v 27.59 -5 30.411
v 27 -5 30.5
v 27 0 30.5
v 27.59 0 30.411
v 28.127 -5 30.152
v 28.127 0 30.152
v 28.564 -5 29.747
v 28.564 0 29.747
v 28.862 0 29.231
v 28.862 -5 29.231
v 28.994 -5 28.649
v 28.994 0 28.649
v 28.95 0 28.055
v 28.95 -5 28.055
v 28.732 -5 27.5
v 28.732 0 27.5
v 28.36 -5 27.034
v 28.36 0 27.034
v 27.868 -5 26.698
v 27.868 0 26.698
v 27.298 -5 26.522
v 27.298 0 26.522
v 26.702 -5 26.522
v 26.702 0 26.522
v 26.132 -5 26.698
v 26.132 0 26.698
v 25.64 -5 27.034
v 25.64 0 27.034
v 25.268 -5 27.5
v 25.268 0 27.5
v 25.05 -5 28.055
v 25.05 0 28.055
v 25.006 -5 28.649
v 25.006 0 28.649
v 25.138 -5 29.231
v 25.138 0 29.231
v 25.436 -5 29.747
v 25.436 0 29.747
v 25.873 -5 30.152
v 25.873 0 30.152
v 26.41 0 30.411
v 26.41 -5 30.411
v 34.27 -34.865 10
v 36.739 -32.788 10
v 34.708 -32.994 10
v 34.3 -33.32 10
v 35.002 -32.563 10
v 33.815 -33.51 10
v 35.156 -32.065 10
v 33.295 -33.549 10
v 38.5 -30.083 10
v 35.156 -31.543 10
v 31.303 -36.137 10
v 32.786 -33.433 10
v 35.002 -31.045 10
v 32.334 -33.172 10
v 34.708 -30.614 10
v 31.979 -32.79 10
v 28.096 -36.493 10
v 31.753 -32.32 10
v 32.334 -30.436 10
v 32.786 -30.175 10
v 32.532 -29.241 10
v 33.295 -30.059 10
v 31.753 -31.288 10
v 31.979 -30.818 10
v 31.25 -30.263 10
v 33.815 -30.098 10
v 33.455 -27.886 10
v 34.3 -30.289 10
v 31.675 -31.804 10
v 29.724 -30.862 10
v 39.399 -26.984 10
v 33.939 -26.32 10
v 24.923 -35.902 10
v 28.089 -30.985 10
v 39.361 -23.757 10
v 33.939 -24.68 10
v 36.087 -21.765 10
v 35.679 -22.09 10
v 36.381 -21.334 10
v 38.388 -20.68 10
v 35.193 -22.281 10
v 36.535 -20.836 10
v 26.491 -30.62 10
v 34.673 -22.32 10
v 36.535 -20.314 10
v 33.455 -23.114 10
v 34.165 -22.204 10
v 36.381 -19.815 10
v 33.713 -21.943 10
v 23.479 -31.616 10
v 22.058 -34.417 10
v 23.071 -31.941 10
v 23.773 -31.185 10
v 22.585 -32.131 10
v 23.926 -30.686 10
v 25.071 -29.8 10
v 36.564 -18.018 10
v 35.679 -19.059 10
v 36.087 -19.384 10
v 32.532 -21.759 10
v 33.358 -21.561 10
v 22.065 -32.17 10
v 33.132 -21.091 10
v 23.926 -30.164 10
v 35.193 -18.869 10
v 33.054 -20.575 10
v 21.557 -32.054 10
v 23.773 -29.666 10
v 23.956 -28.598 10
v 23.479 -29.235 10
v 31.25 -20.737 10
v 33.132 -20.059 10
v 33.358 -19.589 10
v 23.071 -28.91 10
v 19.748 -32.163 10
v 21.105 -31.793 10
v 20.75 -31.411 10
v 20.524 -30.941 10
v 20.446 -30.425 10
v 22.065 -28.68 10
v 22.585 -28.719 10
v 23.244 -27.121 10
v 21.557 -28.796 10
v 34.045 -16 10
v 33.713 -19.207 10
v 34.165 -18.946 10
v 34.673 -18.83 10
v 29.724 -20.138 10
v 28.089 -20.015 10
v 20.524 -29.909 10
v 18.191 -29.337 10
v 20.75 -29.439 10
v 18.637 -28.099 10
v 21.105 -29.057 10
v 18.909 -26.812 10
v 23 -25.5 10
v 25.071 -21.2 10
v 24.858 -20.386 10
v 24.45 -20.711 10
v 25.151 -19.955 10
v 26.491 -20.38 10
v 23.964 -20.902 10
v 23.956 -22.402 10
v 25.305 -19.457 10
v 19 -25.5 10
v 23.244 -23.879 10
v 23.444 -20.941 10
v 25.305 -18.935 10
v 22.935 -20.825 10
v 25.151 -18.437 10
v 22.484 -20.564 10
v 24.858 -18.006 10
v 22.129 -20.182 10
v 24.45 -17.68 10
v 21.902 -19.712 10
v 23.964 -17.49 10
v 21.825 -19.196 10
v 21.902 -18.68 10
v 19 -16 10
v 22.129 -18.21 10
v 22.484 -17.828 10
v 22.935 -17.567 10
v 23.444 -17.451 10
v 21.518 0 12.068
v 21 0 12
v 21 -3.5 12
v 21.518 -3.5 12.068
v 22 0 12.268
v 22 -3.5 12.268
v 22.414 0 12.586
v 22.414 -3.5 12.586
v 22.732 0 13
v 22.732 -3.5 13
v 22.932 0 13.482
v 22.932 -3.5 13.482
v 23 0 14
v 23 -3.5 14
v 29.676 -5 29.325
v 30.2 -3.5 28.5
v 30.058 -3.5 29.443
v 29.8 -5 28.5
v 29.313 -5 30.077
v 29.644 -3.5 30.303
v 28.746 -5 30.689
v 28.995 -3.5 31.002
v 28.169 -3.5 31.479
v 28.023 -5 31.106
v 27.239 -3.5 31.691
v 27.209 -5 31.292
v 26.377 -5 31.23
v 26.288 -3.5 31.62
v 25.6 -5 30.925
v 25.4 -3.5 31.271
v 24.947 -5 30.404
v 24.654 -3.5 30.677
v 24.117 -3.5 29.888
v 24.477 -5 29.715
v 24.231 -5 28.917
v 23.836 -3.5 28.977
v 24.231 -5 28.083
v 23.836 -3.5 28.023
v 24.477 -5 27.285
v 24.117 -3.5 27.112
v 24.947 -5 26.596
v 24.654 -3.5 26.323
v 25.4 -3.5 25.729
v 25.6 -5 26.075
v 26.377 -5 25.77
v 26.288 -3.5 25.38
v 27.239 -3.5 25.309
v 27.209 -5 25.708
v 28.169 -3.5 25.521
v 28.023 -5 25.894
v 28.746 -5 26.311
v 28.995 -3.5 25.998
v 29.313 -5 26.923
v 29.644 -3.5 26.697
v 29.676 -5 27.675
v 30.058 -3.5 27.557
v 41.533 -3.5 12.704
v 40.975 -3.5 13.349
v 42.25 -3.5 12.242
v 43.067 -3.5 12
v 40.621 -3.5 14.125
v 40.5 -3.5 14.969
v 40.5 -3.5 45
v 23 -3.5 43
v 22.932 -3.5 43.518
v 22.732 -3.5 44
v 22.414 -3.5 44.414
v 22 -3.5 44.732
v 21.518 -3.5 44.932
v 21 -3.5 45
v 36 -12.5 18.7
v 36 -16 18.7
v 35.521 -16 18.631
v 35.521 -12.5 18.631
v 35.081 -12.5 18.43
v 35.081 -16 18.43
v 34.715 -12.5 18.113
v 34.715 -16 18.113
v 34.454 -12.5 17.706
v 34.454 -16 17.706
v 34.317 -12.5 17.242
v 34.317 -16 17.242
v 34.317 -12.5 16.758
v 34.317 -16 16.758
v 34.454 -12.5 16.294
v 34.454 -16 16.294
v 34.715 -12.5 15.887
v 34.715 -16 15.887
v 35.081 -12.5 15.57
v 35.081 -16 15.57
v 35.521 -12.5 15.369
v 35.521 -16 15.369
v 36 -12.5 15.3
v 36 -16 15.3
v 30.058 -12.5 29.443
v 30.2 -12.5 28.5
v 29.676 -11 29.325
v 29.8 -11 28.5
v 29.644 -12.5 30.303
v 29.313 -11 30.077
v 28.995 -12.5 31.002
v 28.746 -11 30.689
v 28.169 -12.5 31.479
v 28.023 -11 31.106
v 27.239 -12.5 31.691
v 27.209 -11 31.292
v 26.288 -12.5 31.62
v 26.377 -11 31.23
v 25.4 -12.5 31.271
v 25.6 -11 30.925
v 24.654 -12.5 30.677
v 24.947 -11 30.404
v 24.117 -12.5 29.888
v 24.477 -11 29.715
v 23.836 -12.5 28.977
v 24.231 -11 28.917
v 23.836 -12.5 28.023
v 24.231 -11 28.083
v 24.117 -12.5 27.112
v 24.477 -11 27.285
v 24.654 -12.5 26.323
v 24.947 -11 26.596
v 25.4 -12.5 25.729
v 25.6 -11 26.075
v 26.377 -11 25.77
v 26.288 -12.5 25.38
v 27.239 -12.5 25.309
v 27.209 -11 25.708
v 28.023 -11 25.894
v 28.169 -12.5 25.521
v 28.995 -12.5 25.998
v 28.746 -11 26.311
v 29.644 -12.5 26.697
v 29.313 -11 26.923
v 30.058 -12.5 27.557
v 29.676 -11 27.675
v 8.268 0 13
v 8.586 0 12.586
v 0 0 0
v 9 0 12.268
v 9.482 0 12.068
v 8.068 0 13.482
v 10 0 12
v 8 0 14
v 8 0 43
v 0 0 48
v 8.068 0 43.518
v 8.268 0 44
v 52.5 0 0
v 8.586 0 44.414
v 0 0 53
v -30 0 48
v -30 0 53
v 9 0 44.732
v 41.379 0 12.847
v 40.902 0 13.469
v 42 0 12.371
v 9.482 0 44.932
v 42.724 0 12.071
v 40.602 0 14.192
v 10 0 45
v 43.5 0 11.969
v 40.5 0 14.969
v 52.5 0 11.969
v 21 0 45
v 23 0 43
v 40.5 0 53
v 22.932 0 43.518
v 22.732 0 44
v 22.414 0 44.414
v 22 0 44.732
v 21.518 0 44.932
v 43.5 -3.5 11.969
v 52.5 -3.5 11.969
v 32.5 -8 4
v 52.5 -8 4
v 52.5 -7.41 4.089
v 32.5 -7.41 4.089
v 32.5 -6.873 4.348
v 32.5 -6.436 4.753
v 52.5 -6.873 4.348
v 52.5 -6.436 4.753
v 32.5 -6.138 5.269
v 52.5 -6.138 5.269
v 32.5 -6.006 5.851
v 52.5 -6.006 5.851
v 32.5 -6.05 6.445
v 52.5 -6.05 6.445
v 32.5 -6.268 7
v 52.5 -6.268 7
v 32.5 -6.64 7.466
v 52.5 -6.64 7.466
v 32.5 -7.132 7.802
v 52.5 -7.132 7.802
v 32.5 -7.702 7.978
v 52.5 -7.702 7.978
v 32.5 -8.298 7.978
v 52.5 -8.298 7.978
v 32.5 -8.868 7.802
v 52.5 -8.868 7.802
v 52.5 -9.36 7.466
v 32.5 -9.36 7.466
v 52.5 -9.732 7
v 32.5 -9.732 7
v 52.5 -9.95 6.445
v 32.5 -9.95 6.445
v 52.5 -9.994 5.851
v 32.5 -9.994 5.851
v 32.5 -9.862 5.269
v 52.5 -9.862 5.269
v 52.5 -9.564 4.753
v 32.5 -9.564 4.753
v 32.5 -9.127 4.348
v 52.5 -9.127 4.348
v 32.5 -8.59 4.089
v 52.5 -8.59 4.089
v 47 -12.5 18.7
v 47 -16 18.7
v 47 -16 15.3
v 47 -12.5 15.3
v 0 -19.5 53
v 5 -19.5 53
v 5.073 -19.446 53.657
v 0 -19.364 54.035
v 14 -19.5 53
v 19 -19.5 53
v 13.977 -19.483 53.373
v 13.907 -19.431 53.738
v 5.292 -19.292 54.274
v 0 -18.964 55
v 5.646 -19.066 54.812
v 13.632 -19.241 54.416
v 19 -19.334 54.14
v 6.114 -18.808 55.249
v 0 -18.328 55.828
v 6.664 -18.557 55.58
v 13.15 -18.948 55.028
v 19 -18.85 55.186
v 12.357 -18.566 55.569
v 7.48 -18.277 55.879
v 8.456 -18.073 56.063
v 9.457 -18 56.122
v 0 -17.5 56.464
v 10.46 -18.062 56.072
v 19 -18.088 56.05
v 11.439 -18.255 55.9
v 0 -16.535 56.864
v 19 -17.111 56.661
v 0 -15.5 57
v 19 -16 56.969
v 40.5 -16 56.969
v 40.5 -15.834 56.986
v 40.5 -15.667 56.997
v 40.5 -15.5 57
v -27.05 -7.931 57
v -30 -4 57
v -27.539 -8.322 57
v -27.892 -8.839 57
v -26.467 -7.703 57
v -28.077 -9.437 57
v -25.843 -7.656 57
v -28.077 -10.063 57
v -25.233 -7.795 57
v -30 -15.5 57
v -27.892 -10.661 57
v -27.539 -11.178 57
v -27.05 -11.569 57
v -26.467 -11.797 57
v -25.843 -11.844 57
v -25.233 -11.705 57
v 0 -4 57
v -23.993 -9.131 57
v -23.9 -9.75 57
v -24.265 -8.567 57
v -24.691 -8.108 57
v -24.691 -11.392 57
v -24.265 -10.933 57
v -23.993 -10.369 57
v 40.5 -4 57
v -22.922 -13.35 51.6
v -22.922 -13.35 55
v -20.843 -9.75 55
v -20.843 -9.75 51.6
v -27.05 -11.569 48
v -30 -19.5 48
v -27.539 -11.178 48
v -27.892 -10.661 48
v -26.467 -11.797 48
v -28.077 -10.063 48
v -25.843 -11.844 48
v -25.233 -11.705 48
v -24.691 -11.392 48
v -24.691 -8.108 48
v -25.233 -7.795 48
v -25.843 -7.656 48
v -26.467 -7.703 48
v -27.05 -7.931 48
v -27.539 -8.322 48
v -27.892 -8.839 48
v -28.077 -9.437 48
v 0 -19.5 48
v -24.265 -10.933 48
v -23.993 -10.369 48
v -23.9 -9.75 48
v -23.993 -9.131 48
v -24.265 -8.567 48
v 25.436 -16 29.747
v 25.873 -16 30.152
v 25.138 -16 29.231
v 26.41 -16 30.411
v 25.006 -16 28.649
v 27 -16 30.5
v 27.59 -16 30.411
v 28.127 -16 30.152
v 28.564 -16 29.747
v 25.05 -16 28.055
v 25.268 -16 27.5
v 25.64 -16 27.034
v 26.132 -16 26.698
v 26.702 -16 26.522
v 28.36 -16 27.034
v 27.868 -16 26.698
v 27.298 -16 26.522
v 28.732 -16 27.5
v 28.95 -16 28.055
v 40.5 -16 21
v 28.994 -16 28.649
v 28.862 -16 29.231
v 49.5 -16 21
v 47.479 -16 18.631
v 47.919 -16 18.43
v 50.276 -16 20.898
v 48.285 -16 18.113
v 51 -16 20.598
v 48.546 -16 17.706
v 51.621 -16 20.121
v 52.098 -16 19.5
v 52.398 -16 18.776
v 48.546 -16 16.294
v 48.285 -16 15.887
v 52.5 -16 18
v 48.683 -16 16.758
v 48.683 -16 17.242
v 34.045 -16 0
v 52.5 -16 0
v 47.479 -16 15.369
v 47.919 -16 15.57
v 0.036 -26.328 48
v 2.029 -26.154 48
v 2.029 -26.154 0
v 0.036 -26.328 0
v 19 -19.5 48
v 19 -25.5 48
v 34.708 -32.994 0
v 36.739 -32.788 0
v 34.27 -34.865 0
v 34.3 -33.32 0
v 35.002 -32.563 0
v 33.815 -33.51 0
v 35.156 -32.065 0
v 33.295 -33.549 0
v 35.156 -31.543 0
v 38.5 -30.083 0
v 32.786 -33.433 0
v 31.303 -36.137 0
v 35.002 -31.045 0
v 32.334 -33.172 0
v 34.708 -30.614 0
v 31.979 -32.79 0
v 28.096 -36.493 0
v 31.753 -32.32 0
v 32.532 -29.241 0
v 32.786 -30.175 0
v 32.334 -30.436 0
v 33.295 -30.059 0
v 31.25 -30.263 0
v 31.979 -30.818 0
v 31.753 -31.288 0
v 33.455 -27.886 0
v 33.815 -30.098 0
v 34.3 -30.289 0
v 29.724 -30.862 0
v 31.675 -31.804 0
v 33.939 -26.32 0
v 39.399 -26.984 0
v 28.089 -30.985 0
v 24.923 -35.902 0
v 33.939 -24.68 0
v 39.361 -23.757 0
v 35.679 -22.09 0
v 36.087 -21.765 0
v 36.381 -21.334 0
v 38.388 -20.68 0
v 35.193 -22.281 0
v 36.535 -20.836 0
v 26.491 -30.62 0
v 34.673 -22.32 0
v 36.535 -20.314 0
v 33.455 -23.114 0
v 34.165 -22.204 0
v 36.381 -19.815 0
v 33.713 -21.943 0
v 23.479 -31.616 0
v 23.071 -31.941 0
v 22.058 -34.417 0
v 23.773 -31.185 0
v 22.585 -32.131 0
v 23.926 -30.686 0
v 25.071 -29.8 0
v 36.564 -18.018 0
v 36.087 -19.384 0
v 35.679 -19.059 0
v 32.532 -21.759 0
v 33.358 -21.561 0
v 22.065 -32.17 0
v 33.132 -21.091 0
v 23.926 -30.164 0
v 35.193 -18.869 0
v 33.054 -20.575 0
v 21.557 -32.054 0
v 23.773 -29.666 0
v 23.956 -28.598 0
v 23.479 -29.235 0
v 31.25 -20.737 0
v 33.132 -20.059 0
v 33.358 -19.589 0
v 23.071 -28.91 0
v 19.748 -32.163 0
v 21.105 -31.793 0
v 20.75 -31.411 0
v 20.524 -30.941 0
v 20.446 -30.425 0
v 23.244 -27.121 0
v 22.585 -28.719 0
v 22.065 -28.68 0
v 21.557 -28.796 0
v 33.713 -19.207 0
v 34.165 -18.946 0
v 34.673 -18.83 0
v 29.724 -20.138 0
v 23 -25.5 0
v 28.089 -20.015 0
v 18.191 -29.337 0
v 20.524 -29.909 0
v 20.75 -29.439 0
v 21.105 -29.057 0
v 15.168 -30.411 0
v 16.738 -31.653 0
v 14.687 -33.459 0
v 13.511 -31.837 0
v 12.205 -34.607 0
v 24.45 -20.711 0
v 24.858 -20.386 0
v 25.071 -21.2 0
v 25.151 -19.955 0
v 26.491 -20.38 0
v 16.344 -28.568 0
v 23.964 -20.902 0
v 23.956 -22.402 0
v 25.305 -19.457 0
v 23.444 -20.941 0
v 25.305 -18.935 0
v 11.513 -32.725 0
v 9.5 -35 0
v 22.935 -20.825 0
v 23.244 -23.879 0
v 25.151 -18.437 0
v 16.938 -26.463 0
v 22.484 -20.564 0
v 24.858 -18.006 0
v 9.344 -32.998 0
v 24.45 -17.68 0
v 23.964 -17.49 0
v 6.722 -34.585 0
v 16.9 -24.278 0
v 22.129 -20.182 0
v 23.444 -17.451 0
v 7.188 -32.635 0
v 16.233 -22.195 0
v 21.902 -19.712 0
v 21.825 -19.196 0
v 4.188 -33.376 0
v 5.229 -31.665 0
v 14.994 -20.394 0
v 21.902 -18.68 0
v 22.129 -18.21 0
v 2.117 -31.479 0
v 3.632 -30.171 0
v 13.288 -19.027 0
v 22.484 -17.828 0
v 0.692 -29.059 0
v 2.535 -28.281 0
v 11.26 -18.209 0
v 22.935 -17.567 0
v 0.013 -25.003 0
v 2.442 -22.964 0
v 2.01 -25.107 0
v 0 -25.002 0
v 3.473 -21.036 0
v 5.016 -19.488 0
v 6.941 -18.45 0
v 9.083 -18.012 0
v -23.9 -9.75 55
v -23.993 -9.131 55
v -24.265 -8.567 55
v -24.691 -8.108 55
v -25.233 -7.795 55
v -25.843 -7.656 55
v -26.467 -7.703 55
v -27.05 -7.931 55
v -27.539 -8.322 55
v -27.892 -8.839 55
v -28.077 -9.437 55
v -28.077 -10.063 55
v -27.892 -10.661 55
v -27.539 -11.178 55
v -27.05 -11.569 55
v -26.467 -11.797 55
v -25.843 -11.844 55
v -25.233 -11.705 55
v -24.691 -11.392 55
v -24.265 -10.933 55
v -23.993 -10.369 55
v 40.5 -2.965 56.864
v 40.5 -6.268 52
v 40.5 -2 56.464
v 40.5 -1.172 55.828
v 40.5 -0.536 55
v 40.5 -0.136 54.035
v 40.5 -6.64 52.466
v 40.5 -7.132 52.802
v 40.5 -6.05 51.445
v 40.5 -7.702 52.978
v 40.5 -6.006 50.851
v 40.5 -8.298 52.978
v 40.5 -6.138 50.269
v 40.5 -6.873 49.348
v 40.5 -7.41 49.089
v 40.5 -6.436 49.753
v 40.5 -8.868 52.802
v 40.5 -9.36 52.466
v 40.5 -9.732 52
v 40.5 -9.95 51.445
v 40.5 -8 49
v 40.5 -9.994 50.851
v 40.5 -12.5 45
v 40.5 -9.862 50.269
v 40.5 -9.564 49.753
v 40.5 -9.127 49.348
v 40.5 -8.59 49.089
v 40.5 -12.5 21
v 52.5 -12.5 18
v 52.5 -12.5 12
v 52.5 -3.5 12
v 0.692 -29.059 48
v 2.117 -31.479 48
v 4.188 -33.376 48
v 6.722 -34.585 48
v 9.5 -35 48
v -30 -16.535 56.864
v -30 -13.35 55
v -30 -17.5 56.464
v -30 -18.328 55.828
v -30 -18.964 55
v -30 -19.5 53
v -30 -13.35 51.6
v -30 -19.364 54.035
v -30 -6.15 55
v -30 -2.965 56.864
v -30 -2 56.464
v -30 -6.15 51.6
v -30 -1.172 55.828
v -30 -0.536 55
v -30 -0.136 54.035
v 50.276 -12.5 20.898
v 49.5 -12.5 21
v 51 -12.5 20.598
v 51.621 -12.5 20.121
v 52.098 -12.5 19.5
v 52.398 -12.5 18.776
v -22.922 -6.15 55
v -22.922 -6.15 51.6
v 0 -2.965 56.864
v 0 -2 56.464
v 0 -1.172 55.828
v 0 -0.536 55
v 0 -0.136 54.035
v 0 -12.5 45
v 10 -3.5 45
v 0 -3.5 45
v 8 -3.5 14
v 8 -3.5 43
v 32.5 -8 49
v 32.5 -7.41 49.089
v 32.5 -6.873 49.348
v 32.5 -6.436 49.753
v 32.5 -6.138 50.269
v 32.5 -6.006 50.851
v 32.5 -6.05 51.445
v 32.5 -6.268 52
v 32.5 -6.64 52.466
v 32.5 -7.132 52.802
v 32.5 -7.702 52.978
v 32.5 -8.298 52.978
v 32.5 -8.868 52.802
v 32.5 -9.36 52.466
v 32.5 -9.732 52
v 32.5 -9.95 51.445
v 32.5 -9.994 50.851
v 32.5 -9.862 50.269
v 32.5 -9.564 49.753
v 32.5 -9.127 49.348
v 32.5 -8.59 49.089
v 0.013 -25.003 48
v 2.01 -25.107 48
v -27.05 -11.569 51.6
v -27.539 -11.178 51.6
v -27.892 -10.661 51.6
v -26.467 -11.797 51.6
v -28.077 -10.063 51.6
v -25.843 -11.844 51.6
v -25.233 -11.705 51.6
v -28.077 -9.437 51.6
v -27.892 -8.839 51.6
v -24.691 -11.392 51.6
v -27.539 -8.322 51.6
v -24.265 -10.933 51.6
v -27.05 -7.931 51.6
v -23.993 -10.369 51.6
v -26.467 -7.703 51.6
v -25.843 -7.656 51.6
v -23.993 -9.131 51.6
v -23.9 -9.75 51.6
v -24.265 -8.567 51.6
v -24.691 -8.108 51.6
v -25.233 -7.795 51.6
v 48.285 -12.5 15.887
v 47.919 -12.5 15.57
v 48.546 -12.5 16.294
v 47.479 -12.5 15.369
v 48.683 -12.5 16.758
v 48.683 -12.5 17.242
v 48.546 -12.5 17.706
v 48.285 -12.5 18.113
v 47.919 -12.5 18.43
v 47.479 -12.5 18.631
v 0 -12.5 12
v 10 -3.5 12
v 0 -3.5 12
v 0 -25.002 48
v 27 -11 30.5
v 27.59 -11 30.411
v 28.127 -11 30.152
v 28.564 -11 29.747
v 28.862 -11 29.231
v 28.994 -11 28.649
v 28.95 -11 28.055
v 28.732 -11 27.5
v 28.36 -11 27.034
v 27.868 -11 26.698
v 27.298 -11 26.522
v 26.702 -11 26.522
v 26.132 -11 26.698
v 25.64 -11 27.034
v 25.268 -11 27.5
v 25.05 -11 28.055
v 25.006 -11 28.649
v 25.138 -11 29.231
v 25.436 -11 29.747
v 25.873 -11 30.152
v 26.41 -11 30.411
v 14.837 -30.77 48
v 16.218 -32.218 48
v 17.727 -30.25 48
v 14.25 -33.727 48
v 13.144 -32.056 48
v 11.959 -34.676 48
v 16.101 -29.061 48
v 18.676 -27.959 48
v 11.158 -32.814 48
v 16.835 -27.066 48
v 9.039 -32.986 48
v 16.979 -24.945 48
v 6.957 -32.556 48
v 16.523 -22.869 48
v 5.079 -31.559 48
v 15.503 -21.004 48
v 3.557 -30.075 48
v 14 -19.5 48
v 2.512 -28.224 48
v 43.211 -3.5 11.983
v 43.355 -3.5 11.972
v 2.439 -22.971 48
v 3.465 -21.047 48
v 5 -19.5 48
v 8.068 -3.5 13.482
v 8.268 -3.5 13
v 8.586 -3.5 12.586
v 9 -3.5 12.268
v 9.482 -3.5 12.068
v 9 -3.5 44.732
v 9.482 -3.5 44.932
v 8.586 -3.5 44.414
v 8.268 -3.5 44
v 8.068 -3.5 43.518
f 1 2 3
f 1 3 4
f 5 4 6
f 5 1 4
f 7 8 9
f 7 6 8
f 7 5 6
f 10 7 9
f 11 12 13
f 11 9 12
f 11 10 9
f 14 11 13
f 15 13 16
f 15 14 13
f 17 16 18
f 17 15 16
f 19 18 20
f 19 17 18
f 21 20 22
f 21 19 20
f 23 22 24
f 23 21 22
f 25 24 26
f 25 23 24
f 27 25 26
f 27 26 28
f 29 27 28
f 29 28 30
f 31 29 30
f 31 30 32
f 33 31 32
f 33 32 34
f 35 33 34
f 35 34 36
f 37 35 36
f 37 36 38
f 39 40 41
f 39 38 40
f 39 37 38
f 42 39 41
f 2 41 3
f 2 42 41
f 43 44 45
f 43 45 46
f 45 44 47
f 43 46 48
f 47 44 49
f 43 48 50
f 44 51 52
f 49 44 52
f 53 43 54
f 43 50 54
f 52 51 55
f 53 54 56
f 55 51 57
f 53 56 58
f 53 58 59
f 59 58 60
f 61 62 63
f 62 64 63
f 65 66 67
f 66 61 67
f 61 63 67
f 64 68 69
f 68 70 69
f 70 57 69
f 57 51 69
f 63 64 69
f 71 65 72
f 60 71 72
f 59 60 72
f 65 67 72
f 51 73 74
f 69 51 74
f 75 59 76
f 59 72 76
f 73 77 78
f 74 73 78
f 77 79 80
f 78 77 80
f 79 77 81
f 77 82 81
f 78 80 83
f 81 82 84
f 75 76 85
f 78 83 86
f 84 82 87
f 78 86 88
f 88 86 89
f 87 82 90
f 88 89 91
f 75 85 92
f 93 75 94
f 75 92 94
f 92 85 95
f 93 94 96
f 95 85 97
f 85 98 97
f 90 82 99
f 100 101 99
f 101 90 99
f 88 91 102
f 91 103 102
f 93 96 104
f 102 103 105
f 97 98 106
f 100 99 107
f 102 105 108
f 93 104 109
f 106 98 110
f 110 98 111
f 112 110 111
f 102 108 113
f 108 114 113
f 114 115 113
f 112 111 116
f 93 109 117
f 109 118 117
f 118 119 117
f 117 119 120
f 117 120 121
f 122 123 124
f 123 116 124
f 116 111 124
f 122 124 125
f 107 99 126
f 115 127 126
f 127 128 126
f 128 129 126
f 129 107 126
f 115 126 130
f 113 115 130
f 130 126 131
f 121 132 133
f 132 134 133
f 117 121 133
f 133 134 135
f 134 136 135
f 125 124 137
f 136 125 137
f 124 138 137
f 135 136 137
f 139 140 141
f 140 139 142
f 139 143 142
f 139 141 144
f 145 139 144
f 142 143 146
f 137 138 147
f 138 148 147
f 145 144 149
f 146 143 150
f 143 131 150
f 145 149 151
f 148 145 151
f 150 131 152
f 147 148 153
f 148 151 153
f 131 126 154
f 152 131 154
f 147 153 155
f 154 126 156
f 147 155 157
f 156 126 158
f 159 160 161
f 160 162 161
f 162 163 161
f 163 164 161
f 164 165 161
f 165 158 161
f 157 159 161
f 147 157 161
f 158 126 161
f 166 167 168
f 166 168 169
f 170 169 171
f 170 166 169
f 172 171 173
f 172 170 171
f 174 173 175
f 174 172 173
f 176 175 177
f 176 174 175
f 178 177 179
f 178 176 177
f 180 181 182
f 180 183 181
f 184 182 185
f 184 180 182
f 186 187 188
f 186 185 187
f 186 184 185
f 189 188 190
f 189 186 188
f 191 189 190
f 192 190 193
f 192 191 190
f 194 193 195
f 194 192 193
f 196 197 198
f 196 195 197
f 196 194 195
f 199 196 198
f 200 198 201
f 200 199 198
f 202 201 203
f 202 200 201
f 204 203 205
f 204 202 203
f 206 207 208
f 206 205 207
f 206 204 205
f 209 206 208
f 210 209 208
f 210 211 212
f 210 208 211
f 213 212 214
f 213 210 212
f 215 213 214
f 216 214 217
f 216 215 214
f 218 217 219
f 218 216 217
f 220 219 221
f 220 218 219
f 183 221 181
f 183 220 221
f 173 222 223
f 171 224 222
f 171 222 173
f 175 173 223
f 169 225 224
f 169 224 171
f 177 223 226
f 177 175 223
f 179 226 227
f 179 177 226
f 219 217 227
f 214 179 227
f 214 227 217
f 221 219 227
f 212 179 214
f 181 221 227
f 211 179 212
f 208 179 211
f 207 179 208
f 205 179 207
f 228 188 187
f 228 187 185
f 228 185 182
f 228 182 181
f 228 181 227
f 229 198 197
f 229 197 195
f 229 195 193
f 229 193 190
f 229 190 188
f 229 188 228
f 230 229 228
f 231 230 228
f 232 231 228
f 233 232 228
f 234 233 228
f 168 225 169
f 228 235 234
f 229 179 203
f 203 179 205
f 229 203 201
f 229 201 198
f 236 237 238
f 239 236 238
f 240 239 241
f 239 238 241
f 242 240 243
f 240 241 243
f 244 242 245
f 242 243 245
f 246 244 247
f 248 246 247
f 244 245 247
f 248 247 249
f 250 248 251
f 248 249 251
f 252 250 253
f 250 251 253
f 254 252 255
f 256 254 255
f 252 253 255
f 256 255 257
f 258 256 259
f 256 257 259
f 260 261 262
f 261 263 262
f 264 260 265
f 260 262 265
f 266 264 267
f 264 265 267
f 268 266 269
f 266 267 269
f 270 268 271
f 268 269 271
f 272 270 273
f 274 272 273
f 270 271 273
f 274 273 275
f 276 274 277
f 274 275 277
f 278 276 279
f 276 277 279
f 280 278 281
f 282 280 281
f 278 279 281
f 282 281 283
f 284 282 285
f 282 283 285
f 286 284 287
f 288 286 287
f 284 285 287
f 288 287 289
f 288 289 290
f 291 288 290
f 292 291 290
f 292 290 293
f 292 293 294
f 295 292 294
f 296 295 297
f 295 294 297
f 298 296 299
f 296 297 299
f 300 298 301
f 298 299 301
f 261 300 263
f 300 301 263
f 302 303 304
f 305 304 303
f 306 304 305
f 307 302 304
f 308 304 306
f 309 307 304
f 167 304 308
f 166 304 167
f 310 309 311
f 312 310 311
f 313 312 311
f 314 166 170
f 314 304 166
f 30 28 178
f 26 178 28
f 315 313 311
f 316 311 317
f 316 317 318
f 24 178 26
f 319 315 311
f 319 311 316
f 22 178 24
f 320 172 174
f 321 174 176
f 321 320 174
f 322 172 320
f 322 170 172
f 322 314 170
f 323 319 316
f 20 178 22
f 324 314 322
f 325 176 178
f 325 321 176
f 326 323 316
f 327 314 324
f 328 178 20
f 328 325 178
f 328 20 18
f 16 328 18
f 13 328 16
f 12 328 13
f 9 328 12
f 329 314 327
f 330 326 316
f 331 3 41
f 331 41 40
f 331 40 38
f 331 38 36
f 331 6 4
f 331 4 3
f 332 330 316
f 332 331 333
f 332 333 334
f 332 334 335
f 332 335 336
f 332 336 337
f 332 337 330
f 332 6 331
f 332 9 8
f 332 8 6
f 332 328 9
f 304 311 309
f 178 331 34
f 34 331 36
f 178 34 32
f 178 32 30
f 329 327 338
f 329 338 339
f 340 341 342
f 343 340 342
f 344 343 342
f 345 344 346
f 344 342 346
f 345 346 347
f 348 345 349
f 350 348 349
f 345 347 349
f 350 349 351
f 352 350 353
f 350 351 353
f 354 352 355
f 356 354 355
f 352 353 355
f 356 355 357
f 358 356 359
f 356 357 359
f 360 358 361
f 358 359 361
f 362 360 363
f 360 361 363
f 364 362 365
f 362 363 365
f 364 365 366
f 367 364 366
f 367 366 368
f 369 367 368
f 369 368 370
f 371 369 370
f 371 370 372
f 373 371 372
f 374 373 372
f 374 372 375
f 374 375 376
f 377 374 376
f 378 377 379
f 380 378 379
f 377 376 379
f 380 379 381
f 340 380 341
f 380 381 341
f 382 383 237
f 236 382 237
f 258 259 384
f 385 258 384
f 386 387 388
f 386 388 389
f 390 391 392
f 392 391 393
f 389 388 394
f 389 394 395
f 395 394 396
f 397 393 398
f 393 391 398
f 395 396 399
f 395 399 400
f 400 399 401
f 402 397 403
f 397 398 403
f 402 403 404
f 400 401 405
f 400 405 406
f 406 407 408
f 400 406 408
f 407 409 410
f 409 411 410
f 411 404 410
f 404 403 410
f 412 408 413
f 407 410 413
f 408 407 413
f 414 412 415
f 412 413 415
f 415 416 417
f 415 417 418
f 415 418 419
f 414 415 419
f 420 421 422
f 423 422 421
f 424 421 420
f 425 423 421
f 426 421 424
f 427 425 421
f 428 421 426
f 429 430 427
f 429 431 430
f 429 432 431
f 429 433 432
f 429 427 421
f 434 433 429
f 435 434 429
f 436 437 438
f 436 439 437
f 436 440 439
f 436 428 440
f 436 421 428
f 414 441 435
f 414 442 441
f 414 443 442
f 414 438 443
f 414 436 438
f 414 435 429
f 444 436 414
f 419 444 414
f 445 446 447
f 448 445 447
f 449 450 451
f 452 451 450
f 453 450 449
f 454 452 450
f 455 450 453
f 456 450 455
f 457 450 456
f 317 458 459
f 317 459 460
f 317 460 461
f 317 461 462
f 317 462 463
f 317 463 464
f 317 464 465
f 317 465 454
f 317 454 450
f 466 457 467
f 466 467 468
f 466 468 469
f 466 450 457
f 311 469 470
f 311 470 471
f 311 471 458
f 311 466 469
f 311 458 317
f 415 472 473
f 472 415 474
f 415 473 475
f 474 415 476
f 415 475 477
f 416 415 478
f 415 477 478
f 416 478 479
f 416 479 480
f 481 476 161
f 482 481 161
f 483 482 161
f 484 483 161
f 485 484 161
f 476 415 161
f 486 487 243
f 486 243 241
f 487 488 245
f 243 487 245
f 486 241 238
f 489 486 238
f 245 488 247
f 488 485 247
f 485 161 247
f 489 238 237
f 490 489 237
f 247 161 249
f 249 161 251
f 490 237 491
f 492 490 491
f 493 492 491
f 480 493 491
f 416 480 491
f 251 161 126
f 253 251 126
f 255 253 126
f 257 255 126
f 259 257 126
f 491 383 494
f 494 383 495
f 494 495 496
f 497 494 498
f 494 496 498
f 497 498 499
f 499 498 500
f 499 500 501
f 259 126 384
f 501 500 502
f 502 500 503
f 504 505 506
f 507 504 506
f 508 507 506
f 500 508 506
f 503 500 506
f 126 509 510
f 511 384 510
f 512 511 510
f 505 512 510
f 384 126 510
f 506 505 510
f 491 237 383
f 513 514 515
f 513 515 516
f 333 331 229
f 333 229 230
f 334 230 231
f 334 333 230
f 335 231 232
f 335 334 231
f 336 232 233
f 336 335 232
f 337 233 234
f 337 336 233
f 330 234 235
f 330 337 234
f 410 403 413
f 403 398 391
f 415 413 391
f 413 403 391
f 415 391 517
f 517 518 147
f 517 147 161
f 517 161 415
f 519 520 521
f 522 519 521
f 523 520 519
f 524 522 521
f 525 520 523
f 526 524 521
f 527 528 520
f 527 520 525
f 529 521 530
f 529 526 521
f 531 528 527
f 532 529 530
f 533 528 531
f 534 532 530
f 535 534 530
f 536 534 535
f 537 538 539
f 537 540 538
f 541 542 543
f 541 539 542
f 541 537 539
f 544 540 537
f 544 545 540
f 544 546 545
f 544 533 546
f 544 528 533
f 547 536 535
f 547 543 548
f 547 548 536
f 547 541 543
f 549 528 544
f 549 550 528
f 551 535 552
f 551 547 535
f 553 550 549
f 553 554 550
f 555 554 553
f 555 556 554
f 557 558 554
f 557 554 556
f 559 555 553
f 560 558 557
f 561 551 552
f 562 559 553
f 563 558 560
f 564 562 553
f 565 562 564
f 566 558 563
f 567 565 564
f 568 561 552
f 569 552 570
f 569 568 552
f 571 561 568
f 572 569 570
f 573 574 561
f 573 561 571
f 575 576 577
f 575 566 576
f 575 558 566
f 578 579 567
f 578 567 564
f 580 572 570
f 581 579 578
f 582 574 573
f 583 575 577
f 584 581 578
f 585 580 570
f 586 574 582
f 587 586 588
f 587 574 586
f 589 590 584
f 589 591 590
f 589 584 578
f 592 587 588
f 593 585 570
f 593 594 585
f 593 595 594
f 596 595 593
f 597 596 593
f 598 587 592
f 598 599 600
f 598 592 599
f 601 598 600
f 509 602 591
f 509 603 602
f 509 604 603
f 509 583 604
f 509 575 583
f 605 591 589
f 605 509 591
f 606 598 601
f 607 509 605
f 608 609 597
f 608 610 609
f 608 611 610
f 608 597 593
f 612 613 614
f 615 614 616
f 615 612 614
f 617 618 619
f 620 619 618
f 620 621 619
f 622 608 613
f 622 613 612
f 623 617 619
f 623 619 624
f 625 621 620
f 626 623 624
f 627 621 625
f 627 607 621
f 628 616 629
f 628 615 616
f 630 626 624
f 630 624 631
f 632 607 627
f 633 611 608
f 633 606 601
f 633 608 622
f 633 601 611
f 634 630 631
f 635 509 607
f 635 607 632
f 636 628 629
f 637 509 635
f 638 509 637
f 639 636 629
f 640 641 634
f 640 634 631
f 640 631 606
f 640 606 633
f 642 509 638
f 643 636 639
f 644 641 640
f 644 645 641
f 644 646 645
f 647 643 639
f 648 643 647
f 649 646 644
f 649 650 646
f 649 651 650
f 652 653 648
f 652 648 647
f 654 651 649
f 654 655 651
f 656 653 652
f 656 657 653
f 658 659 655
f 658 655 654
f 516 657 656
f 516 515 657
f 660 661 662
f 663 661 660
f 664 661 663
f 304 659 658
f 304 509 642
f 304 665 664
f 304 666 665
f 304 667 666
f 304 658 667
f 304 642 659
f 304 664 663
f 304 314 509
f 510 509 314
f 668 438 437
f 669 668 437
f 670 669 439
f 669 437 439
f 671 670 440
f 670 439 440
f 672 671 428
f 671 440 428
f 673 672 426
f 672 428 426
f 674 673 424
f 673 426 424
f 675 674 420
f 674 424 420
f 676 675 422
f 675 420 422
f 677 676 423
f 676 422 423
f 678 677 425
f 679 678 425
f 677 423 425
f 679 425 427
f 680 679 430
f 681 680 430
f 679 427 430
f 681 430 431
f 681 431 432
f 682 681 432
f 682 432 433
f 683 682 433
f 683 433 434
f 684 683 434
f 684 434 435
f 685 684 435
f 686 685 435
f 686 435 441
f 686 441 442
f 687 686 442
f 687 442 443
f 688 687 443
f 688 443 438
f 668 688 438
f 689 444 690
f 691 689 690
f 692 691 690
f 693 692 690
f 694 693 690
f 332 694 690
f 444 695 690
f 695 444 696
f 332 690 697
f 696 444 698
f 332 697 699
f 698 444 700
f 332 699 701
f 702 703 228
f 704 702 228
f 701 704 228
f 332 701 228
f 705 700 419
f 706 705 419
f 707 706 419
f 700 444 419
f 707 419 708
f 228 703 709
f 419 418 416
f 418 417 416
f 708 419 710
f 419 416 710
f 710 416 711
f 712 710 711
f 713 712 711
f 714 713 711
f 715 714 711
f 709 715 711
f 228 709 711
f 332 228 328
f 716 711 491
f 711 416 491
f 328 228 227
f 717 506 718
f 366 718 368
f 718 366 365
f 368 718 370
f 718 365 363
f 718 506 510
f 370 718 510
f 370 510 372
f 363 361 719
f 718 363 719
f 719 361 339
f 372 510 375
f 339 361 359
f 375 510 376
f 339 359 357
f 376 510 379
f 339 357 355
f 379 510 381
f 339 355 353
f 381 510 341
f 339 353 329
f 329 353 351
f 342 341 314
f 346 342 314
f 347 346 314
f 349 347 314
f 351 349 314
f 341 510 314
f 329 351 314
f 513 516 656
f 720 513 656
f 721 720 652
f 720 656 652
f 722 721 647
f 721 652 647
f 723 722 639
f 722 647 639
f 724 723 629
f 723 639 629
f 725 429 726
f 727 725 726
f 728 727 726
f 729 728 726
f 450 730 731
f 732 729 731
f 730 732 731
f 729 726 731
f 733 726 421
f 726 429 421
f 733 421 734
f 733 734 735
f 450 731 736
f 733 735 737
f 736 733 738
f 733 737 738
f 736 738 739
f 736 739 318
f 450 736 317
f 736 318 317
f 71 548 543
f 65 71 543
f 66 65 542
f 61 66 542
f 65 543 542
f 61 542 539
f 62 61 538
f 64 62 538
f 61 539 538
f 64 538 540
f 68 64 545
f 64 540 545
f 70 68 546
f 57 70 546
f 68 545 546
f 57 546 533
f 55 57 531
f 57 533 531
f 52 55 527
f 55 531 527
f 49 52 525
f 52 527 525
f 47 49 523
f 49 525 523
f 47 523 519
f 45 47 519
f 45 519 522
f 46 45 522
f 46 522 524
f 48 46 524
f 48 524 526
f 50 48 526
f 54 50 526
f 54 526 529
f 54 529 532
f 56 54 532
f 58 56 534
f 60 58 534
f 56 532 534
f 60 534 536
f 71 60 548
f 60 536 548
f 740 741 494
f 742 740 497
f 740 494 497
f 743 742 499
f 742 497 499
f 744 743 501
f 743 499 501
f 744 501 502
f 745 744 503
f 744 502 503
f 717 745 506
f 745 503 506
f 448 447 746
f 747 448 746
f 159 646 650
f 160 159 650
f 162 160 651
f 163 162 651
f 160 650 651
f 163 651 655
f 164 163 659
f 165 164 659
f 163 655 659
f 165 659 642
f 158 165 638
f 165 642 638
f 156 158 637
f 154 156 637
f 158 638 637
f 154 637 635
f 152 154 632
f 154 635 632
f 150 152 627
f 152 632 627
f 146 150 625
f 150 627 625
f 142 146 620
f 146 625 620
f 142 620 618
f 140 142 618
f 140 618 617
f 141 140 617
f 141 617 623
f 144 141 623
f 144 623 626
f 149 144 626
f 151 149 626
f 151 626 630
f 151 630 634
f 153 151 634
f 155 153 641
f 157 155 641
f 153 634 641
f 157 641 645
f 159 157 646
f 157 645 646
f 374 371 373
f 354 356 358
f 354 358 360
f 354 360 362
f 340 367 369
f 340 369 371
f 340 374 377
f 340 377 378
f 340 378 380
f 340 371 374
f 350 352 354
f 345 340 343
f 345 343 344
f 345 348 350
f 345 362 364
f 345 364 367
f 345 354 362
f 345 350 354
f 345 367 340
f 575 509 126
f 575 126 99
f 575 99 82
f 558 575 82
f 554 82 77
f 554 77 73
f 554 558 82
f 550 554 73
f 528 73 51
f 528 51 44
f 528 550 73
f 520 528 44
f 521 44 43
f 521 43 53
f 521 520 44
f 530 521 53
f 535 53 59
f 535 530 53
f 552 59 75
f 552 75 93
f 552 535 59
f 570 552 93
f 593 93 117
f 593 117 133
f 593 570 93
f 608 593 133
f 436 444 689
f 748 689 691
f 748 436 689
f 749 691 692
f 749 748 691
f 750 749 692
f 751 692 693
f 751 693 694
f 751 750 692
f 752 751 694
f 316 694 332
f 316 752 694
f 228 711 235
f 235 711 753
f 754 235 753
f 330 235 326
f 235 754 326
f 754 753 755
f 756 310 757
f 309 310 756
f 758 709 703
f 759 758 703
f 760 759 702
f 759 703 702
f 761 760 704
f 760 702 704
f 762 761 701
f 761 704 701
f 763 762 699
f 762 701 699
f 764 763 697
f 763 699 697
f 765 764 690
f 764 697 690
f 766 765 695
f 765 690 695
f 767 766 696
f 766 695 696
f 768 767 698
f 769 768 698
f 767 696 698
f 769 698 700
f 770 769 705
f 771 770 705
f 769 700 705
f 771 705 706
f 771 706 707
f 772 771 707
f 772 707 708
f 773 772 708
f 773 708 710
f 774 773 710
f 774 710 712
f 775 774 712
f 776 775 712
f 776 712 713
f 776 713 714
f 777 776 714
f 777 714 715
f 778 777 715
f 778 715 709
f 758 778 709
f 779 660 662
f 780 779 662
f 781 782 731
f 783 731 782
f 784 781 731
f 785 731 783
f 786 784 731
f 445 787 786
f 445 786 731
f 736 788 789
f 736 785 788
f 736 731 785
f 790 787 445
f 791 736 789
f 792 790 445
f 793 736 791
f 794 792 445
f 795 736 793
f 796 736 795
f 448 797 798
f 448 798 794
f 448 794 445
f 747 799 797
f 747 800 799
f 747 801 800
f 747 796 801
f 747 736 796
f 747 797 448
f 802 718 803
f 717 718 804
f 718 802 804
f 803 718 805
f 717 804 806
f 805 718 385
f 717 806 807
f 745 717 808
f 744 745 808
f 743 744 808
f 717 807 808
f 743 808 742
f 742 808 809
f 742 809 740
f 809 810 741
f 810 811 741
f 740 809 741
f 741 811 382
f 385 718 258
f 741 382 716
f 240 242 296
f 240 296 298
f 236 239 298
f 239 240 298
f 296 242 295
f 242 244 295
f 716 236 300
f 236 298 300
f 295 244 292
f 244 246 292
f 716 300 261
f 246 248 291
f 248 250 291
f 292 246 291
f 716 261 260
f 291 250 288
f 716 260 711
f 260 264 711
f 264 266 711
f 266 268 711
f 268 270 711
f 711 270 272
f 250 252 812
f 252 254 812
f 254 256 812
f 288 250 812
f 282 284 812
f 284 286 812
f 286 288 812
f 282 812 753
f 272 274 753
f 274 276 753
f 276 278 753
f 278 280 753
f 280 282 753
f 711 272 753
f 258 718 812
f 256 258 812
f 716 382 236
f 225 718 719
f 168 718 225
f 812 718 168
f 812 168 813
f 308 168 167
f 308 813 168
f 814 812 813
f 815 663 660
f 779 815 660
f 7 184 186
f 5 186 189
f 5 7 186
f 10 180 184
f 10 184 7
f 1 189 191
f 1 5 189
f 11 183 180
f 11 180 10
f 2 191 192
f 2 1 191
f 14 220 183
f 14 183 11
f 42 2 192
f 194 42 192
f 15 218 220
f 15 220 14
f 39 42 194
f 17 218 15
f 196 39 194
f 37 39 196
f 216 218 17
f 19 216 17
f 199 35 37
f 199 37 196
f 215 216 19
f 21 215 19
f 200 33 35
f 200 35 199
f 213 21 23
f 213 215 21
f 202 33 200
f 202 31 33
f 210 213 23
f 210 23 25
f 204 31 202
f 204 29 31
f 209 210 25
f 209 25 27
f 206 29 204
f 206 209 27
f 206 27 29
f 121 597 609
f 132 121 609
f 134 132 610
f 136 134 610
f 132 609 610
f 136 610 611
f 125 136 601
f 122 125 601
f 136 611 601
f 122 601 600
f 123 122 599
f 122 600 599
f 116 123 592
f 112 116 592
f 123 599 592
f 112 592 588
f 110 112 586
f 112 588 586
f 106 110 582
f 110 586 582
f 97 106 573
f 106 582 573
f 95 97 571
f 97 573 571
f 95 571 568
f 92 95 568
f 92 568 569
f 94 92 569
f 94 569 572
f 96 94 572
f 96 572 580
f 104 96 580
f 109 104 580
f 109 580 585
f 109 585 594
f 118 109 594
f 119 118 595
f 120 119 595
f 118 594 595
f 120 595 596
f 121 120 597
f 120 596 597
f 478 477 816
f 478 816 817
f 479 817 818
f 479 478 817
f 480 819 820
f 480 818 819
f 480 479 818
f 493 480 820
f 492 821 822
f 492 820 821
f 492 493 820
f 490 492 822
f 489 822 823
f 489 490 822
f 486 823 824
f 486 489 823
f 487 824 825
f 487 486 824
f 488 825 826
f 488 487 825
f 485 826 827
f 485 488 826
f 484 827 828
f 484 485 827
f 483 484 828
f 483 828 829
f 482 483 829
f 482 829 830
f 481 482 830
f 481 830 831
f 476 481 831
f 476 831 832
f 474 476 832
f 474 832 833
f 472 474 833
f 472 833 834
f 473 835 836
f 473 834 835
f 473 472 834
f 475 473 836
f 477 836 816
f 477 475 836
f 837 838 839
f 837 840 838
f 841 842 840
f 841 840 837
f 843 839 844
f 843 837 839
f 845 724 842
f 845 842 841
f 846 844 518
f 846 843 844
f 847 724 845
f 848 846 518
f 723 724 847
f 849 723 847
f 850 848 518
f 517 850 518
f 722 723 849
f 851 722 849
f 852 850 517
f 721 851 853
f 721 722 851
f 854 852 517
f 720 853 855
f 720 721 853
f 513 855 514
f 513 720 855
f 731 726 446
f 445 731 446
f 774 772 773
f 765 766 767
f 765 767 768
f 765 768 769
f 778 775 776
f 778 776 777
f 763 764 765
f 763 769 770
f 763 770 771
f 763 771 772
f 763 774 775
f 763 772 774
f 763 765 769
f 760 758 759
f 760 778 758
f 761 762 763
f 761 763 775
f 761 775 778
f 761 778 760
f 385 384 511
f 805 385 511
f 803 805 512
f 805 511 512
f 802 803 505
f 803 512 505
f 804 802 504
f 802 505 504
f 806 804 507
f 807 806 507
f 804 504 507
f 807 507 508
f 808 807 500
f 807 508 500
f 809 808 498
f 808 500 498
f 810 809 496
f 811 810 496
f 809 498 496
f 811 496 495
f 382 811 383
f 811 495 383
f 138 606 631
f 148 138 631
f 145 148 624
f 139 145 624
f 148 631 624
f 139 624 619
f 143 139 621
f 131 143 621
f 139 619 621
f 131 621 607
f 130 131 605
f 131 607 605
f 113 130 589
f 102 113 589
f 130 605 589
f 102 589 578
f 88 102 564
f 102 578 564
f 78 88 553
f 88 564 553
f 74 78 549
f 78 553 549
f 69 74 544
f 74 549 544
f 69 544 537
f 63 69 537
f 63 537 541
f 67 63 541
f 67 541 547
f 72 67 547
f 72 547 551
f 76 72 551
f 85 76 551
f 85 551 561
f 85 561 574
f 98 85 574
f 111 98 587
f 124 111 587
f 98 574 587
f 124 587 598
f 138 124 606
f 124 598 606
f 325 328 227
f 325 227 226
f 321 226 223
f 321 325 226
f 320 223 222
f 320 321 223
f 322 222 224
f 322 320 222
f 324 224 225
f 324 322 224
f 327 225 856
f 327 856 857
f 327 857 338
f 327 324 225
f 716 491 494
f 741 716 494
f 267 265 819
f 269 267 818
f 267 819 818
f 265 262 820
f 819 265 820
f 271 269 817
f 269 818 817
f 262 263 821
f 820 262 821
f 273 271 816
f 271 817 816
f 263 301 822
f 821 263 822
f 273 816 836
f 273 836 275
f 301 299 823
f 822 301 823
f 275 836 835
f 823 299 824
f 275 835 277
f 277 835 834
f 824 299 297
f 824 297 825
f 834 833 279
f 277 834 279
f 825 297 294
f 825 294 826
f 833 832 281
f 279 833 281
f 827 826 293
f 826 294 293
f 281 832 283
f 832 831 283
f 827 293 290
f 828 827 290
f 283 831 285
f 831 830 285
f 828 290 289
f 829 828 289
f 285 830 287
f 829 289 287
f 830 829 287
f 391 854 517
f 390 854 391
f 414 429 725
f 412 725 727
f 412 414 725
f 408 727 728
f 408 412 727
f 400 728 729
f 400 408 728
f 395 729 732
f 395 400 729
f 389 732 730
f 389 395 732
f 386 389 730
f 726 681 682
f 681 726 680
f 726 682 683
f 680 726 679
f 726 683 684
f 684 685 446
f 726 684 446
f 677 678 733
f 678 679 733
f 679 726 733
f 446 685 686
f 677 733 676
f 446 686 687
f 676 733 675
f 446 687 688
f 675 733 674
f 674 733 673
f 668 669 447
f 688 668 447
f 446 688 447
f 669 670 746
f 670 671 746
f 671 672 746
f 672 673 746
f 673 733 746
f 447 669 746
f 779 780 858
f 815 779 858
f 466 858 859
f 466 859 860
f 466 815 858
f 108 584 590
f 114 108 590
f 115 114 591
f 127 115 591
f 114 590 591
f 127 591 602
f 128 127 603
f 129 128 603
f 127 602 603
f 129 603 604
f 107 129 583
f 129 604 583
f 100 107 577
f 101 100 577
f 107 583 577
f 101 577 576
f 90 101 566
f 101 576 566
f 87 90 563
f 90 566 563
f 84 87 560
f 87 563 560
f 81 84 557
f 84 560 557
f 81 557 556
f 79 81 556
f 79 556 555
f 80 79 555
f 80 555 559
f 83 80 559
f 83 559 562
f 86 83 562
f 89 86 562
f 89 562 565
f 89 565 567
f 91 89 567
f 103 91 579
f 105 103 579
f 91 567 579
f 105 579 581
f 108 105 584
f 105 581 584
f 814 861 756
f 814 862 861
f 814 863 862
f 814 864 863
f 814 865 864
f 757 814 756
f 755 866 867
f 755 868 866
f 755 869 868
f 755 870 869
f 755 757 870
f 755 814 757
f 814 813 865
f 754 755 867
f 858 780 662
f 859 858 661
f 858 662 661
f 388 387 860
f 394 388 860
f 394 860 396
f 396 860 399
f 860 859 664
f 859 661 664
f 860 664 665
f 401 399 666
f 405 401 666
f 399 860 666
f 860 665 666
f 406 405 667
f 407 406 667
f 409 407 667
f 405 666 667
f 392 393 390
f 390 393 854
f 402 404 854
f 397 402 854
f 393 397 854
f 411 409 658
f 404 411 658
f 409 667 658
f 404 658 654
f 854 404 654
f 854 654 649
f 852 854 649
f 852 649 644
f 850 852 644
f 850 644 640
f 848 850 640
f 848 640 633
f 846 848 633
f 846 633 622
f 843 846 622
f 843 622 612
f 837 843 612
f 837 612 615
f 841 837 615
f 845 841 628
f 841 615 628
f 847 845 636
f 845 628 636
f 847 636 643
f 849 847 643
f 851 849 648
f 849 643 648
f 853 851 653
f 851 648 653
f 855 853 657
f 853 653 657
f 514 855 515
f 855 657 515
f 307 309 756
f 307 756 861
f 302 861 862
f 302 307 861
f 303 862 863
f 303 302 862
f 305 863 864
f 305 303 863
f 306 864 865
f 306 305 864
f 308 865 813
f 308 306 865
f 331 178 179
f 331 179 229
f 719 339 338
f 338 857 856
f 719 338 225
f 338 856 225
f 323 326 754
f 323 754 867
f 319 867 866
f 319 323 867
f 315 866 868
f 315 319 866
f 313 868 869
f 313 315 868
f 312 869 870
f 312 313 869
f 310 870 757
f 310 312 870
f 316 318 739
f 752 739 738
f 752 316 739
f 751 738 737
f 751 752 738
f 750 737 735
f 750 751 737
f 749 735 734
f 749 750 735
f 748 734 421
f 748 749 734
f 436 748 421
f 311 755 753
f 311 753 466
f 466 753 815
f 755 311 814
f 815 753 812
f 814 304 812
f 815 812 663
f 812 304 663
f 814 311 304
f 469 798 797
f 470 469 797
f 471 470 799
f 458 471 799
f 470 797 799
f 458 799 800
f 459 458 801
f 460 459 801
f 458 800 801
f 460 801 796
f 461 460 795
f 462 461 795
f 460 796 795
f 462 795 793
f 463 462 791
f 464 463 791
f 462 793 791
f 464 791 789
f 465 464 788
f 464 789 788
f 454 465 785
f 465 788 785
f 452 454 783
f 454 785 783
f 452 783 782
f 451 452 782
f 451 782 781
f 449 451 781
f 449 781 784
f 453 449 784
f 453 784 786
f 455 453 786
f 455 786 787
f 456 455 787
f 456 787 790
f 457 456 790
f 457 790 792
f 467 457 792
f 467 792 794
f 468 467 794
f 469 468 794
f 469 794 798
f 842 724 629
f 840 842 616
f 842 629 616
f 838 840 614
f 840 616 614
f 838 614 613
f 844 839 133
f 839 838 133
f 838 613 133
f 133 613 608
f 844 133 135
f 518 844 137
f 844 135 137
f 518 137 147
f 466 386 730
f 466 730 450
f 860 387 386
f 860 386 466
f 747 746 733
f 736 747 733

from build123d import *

# Parameters (mm, degrees)
BOSS_EXTRUDE1_DEPTH     = 57
SKETCH3_W               = 33
SKETCH3_H               = 9
SKETCH3_W_2             = 9
SKETCH3_H_2             = 15.5
CUT_EXTRUDE2_DEPTH      = 86.030876745
FILLET1_R               = 4
CUT_EXTRUDE3_DEPTH      = 86.030876745
CUT_EXTRUDE4_REACH      = 81.789
CUT_EXTRUDE5_DEPTH      = 3.5
SKETCH9_R               = 3.2
SKETCH10_R              = 2.8
CUT_EXTRUDE6_DEPTH      = 82.124903768
CUT_EXTRUDE6_DEPTH_BACK = 82.124903768
SKETCH11_R              = 2
SKETCH13_R              = 2
CUT_EXTRUDE7_DEPTH      = 20
SKETCH14_R              = 1.75
SKETCH14_R_2            = 5.5
BOSS_EXTRUDE2_DEPTH     = 10
BOSS_EXTRUDE3_DEPTH     = 30
SKETCH16_R              = 2.1
CUT_EXTRUDE8_DEPTH      = 3.4
SKETCH18_R              = 2.1
CUT_EXTRUDE9_DEPTH      = 9


with BuildPart() as part:
    # Sketch1 → Boss-Extrude1 (new body)
    with BuildSketch(Plane.XY):
        Polygon((0, 0), (0, -35), (19, -35), (19, -16), (52.5, -16), (52.5, 0), align=None)
    extrude(amount=BOSS_EXTRUDE1_DEPTH)

    # Sketch3 → Cut-Extrude2 (cut, through all)
    with BuildSketch(Plane.ZY):
        with Locations((28.5, -8)):
            Rectangle(SKETCH3_W, SKETCH3_H)
        with Locations((52.5, -27.25)):
            Rectangle(SKETCH3_W_2, SKETCH3_H_2)
    extrude(amount=-CUT_EXTRUDE2_DEPTH, mode=Mode.SUBTRACT)

    # Fillet1
    fillet1_edges = [part.edges().sort_by_distance(p)[0] for p in [
        (26.25, 0, 57),
        (9.5, -19.5, 57),
    ]]
    fillet(fillet1_edges, radius=FILLET1_R)

    # Sketch4 → Cut-Extrude3 (cut, through all)
    with BuildSketch(Plane(origin=(0, 0, 0), x_dir=(-1, 0, 0), z_dir=(0, 0, -1))):
        with BuildLine():
            Line((-0.01301942, -25.002808416), (-2.010278489, -25.107480328))
            ThreePointArc((-2.010278489, -25.107480328), (-16.998857714, -25.369106952), (-2.028539764, -26.153668071))
            Line((-2.028539764, -26.153668071), (-0.036150368, -26.327979556))
            ThreePointArc((-0.036150368, -26.327979556), (-3.081893028, -32.5041347), (-9.5, -35))
            Line((-9.5, -35), (0, -35))
            Line((0, -35), (0, -25.002053723))
            Line((0, -25.002053723), (-0.01301942, -25.002808416))
        make_face()
        with BuildLine():
            ThreePointArc((-9.5, -35), (-16.217514421, -32.217514421), (-19, -25.5))
            Line((-19, -25.5), (-19, -35))
            Line((-19, -35), (-9.5, -35))
        make_face()
    extrude(amount=-CUT_EXTRUDE3_DEPTH, mode=Mode.SUBTRACT)

    # Cut-Extrude4: up to this face of the body (flat: up to its plane)
    cut_extrude4_end = Plane(part.part.faces().sort_by_distance((26.25, -3.5, 28.5))[0])
    # Sketch5 → Cut-Extrude4 (cut, up to the picked face)
    with BuildSketch(Plane.XZ.offset(16), mode=Mode.PRIVATE) as cut_extrude4_sk1:
        with BuildLine():
            Line((47, 18.7), (36, 18.7))
            ThreePointArc((36, 18.7), (34.3, 17), (36, 15.3))
            Line((36, 15.3), (47, 15.3))
            ThreePointArc((47, 15.3), (48.7, 17), (47, 18.7))
        make_face()
    cut_extrude4_tool1 = split(extrude(cut_extrude4_sk1.sketch, amount=-CUT_EXTRUDE4_REACH, mode=Mode.PRIVATE), bisect_by=cut_extrude4_end, keep=Keep.BOTH, mode=Mode.PRIVATE)
    # Sketch5 → Cut-Extrude4 (cut, up to the picked face)
    with BuildSketch(Plane.XZ.offset(16), mode=Mode.PRIVATE) as cut_extrude4_sk2:
        with BuildLine():
            Line((40.5, 21), (49.5, 21))
            ThreePointArc((49.5, 21), (51.621320344, 20.121320344), (52.5, 18))
            Line((52.5, 18), (52.5, 57))
            Line((52.5, 57), (40.5, 57))
            Line((40.5, 57), (40.5, 21))
        make_face()
    cut_extrude4_tool2 = split(extrude(cut_extrude4_sk2.sketch, amount=-CUT_EXTRUDE4_REACH, mode=Mode.PRIVATE), bisect_by=cut_extrude4_end, keep=Keep.BOTH, mode=Mode.PRIVATE)
    add(cut_extrude4_tool1.solids().sort_by(Axis((41.5, -16, 17), (0, 1, 0)))[0], mode=Mode.SUBTRACT)
    add(cut_extrude4_tool2.solids().sort_by(Axis((46.523723, -16, 38.9169), (0, 1, 0)))[0], mode=Mode.SUBTRACT)

    # Sketch6 → Cut-Extrude5 (cut)
    with BuildSketch(Plane(origin=(0, 0, 0), x_dir=(1, 0, 0), z_dir=(0, 1, 0))):
        with BuildLine():
            Line((10, -12), (21, -12))
            ThreePointArc((21, -12), (22.414213562, -12.585786438), (23, -14))
            Line((23, -14), (23, -43))
            ThreePointArc((23, -43), (22.414213562, -44.414213562), (21, -45))
            Line((21, -45), (10, -45))
            ThreePointArc((10, -45), (8.585786438, -44.414213562), (8, -43))
            Line((8, -43), (8, -14))
            ThreePointArc((8, -14), (8.585786438, -12.585786438), (10, -12))
        make_face()
        with BuildLine():
            Line((43.5, -11.968626967), (52.5, -11.968626967))
            Line((52.5, -11.968626967), (52.5, -56.968626967))
            Line((52.5, -56.968626967), (40.5, -56.968626967))
            Line((40.5, -56.968626967), (40.5, -14.968626967))
            ThreePointArc((40.5, -14.968626967), (41.378679656, -12.847306623), (43.5, -11.968626967))
        make_face()
    extrude(amount=-CUT_EXTRUDE5_DEPTH, mode=Mode.SUBTRACT)

    # Sketch9 → Loft1 section 0
    with BuildSketch(Plane.XZ.offset(3.5)):
        with Locations((27, 28.5)):
            Circle(SKETCH9_R)
    # Sketch10 → Loft1 section 1
    with BuildSketch(Plane(origin=(0, -5, 0), x_dir=(-1, 0, 0), z_dir=(0, -1, 0))):
        with Locations((-27, -28.5)):
            Circle(SKETCH10_R)
    loft1 = loft()

    # Mirror2: Loft1 across plane
    add(loft1.mirror(Plane(origin=(0, -8, 0), x_dir=(0, 0, 1), z_dir=(0, -1, 0))))

    # Sketch11 → Cut-Extrude6 (cut, two sides: drawn at the far end of the back side and taken through both)
    with BuildSketch(Plane(origin=(0, -11, 0), x_dir=(1, 0, 0), z_dir=(0, 1, 0)).offset(-CUT_EXTRUDE6_DEPTH_BACK)):
        with Locations(Location((27, -28.5, 0), (0, 0, 270))):
            Circle(SKETCH11_R)
    extrude(amount=CUT_EXTRUDE6_DEPTH + CUT_EXTRUDE6_DEPTH_BACK, mode=Mode.SUBTRACT)

    # Sketch13 → Cut-Extrude7 (cut)
    with BuildSketch(Plane(origin=(52.5, 0, 0), x_dir=(0, 0, -1), z_dir=(1, 0, 0))):
        with Locations((-6, -8)):
            Circle(SKETCH13_R)
        with Locations((-51, -8)):
            Circle(SKETCH13_R)
    extrude(amount=-CUT_EXTRUDE7_DEPTH, mode=Mode.SUBTRACT)

    # Sketch14 → Boss-Extrude2 (add)
    # profile 1 of 2: a face of its own
    with BuildSketch(Plane(origin=(0, 0, 0), x_dir=(-1, 0, 0), z_dir=(0, 0, -1))):
        with BuildLine():
            ThreePointArc((-19, -19.954731747), (-20.721825407, -17.721825407), (-22.954731747, -16))
            Line((-22.954731747, -16), (-34.045268253, -16))
            ThreePointArc((-34.045268253, -16), (-35.581002842, -33.917802489), (-18.190789474, -29.336688458))
            ThreePointArc((-18.190789474, -29.336688458), (-18.795496221, -27.460548393), (-19, -25.5))
            Line((-19, -25.5), (-19, -19.954731747))
        make_face()
        with Locations((-33.425291803, -31.804086029)):
            Circle(SKETCH14_R, mode=Mode.SUBTRACT)
        with Locations((-22.195913971, -30.425291803)):
            Circle(SKETCH14_R, mode=Mode.SUBTRACT)
        with Locations((-34.804086029, -20.574708197)):
            Circle(SKETCH14_R, mode=Mode.SUBTRACT)
        with Locations((-28.5, -25.5)):
            Circle(SKETCH14_R_2, mode=Mode.SUBTRACT)
        with Locations((-23.574708197, -19.195913971)):
            Circle(SKETCH14_R, mode=Mode.SUBTRACT)
    # profile 2 of 2: a face of its own
    with BuildSketch(Plane(origin=(0, 0, 0), x_dir=(-1, 0, 0), z_dir=(0, 0, -1))):
        with BuildLine():
            Line((-19, -16), (-22.954731747, -16))
            ThreePointArc((-22.954731747, -16), (-20.721825407, -17.721825407), (-19, -19.954731747))
            Line((-19, -19.954731747), (-19, -16))
        make_face()
    extrude(amount=-BOSS_EXTRUDE2_DEPTH)

    # Sketch15 → Boss-Extrude3 (add)
    with BuildSketch(Plane.ZY):
        with BuildLine():
            Line((53, -19.5), (48, -19.5))
            Line((48, -19.5), (48, 0))
            Line((48, 0), (53, 0))
            ThreePointArc((53, 0), (55.828427125, -1.171572875), (57, -4))
            Line((57, -4), (57, -15.5))
            ThreePointArc((57, -15.5), (55.828427125, -18.328427125), (53, -19.5))
        make_face()
    extrude(amount=BOSS_EXTRUDE3_DEPTH)

    # Sketch16 → Cut-Extrude8 (cut)
    with BuildSketch(Plane.XY.offset(55)):
        Polygon((-30, -13.35), (-22.921539031, -13.35), (-20.843078062, -9.75), (-22.921539031, -6.15), (-30, -6.15), align=None)
        with Locations((-26, -9.75)):
            Circle(SKETCH16_R, mode=Mode.SUBTRACT)
    extrude(amount=-CUT_EXTRUDE8_DEPTH, mode=Mode.SUBTRACT)

    # Sketch18 → Cut-Extrude9 (cut)
    with BuildSketch(Plane.XY.offset(57)):
        with Locations((-26, -9.75)):
            Circle(SKETCH18_R)
    extrude(amount=-CUT_EXTRUDE9_DEPTH, mode=Mode.SUBTRACT)


solid = part.part
